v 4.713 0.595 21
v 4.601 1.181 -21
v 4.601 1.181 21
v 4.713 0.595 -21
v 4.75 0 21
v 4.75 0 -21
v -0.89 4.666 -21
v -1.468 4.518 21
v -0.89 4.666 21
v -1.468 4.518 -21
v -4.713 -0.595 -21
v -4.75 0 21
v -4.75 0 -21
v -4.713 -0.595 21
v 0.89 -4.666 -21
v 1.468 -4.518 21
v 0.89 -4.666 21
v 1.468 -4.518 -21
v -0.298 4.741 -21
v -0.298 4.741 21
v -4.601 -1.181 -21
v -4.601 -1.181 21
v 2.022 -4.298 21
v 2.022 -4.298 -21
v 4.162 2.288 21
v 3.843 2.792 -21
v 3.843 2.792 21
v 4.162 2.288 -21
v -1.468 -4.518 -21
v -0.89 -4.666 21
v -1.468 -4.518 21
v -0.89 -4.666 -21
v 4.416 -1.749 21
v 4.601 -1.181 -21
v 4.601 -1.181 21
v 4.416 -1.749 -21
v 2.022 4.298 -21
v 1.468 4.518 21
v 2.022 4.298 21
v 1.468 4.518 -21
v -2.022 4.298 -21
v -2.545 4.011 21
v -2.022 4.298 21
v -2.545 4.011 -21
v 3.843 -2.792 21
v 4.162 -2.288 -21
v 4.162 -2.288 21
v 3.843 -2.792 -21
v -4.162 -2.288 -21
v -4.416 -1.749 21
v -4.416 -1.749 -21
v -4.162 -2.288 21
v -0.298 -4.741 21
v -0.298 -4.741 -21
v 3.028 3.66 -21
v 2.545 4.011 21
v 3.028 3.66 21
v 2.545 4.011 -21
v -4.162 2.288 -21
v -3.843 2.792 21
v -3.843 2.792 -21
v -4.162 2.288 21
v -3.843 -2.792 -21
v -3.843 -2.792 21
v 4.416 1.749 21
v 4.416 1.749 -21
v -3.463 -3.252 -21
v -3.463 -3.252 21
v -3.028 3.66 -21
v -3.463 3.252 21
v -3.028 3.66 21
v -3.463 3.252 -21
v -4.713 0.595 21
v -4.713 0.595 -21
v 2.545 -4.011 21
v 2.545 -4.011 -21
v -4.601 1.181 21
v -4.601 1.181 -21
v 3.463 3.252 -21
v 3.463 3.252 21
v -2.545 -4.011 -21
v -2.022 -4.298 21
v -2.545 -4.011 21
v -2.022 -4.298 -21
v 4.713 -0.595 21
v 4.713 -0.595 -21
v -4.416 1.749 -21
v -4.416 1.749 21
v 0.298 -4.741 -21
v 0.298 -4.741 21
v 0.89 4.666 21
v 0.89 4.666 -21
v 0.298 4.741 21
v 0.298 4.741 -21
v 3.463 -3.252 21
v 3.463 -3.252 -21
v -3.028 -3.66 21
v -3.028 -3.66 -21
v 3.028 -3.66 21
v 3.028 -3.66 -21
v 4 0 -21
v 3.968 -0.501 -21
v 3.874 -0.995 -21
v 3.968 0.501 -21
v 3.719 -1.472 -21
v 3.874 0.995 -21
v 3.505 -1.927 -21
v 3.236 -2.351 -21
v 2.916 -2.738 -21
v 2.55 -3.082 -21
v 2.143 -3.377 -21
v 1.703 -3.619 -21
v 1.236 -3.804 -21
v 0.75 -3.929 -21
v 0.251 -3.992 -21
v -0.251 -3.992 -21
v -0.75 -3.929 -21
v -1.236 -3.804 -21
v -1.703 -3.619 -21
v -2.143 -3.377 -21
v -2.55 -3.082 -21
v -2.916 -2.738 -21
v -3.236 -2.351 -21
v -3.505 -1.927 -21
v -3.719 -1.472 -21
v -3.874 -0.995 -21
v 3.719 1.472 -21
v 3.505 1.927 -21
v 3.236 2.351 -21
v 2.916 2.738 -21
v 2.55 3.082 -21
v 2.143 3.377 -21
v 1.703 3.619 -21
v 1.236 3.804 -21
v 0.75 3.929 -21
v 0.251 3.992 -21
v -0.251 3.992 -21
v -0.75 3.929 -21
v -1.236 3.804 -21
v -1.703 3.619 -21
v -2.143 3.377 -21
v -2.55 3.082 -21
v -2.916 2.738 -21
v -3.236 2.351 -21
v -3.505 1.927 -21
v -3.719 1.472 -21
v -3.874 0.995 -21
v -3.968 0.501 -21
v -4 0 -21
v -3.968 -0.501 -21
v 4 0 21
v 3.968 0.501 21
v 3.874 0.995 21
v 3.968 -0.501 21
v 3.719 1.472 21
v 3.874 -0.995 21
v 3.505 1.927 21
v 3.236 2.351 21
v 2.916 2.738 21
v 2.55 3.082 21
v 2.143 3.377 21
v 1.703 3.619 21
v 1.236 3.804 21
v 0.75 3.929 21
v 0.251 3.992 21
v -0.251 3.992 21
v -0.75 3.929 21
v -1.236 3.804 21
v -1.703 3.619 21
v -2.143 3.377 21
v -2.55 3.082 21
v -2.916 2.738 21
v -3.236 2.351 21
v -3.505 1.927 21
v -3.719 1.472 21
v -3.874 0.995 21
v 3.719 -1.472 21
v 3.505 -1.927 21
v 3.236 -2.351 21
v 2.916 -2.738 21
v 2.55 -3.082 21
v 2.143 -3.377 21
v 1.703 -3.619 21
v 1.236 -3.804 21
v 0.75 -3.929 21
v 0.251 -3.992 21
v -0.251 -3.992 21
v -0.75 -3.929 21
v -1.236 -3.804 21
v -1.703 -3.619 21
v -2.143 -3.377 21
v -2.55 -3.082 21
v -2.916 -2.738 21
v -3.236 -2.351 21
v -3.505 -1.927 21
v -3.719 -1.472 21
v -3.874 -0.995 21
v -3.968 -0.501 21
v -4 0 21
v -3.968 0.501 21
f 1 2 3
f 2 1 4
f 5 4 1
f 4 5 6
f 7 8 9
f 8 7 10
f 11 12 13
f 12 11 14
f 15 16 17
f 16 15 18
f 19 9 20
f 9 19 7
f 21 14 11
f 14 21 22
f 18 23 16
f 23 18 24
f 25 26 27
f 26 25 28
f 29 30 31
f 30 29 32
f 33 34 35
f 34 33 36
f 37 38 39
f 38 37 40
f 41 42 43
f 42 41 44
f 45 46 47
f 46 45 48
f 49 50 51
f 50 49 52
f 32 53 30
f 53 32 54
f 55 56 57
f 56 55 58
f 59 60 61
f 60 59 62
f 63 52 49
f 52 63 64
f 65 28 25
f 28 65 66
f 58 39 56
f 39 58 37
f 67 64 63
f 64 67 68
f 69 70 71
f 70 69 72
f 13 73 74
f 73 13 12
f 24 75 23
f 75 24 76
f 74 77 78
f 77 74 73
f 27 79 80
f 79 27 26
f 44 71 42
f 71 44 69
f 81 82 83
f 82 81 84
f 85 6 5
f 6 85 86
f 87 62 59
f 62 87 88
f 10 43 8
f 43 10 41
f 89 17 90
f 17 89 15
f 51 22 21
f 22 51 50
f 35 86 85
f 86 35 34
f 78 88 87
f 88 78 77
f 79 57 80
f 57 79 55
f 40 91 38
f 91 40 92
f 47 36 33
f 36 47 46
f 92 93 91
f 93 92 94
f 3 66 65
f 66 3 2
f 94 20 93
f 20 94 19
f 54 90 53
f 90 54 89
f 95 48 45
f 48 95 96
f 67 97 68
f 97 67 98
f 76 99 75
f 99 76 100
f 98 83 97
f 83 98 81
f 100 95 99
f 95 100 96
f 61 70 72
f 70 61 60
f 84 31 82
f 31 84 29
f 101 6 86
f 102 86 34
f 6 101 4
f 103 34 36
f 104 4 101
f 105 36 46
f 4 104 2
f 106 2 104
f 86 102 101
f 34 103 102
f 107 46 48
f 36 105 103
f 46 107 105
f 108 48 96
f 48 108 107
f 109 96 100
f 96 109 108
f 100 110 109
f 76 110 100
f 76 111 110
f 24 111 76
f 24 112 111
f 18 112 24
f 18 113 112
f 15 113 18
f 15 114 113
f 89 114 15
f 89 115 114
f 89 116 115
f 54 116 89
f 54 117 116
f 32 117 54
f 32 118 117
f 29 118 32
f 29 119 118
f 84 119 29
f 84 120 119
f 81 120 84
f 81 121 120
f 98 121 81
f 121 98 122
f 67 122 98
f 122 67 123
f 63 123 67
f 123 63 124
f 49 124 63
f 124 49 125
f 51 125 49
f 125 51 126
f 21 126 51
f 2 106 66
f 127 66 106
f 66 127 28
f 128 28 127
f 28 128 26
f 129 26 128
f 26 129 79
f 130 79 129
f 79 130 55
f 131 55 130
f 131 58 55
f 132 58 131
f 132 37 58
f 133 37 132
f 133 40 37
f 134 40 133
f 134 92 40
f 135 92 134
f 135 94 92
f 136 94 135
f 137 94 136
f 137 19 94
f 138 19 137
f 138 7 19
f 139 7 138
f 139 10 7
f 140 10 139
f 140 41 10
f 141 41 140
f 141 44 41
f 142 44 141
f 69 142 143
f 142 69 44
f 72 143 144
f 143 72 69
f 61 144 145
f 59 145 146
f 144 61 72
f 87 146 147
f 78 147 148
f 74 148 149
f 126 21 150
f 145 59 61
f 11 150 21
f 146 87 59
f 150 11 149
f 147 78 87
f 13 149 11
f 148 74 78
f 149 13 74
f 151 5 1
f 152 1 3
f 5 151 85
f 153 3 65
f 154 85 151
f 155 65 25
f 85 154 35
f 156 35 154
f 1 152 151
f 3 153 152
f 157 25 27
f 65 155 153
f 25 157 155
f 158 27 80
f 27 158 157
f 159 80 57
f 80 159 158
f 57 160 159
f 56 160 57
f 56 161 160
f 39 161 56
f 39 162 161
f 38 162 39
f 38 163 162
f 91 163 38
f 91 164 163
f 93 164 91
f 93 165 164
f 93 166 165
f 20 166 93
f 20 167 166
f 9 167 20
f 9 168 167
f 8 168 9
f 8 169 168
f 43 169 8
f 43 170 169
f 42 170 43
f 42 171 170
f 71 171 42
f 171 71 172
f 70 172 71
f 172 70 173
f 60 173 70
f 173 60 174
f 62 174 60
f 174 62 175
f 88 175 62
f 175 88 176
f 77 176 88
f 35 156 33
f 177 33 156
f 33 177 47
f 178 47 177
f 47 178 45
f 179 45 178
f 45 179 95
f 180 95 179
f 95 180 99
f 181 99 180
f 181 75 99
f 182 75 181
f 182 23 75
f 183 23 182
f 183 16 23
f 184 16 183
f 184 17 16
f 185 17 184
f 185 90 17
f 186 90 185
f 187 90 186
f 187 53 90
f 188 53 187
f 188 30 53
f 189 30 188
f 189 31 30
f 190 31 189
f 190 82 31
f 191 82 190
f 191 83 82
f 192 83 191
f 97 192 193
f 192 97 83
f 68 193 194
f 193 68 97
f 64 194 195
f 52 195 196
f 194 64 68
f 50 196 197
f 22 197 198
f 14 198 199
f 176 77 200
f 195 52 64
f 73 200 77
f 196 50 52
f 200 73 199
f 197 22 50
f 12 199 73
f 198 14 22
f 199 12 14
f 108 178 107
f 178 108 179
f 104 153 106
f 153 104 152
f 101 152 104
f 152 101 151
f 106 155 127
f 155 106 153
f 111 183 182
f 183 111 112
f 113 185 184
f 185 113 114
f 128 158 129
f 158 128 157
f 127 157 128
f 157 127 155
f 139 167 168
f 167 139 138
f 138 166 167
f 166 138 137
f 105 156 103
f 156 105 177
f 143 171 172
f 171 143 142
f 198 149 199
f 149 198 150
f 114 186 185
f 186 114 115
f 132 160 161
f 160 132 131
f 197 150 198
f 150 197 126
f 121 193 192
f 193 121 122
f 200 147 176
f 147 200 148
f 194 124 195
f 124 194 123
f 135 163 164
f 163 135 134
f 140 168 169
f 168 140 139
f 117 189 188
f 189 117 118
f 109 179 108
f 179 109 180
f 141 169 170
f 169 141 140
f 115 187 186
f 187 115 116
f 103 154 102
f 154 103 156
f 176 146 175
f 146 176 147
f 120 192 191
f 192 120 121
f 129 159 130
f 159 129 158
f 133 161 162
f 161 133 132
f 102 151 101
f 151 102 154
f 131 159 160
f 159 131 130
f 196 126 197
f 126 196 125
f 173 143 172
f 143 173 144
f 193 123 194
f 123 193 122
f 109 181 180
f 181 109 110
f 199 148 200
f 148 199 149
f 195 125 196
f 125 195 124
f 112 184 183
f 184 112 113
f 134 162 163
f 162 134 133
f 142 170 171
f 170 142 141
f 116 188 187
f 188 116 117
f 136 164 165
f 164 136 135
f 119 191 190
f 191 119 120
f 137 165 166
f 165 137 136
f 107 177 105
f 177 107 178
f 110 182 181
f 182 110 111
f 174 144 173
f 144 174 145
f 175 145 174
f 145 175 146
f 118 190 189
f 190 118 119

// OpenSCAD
$fn = 50;


difference() {
	union() {
		translate(v = [0, 0, -21.0000000000]) {
			cylinder(h = 42, r = 4.7500000000);
		}
	}
	union() {
		translate(v = [0, 0, -100.0000000000]) {
			cylinder(h = 200, r = 4.0000000000);
		}
	}
}
